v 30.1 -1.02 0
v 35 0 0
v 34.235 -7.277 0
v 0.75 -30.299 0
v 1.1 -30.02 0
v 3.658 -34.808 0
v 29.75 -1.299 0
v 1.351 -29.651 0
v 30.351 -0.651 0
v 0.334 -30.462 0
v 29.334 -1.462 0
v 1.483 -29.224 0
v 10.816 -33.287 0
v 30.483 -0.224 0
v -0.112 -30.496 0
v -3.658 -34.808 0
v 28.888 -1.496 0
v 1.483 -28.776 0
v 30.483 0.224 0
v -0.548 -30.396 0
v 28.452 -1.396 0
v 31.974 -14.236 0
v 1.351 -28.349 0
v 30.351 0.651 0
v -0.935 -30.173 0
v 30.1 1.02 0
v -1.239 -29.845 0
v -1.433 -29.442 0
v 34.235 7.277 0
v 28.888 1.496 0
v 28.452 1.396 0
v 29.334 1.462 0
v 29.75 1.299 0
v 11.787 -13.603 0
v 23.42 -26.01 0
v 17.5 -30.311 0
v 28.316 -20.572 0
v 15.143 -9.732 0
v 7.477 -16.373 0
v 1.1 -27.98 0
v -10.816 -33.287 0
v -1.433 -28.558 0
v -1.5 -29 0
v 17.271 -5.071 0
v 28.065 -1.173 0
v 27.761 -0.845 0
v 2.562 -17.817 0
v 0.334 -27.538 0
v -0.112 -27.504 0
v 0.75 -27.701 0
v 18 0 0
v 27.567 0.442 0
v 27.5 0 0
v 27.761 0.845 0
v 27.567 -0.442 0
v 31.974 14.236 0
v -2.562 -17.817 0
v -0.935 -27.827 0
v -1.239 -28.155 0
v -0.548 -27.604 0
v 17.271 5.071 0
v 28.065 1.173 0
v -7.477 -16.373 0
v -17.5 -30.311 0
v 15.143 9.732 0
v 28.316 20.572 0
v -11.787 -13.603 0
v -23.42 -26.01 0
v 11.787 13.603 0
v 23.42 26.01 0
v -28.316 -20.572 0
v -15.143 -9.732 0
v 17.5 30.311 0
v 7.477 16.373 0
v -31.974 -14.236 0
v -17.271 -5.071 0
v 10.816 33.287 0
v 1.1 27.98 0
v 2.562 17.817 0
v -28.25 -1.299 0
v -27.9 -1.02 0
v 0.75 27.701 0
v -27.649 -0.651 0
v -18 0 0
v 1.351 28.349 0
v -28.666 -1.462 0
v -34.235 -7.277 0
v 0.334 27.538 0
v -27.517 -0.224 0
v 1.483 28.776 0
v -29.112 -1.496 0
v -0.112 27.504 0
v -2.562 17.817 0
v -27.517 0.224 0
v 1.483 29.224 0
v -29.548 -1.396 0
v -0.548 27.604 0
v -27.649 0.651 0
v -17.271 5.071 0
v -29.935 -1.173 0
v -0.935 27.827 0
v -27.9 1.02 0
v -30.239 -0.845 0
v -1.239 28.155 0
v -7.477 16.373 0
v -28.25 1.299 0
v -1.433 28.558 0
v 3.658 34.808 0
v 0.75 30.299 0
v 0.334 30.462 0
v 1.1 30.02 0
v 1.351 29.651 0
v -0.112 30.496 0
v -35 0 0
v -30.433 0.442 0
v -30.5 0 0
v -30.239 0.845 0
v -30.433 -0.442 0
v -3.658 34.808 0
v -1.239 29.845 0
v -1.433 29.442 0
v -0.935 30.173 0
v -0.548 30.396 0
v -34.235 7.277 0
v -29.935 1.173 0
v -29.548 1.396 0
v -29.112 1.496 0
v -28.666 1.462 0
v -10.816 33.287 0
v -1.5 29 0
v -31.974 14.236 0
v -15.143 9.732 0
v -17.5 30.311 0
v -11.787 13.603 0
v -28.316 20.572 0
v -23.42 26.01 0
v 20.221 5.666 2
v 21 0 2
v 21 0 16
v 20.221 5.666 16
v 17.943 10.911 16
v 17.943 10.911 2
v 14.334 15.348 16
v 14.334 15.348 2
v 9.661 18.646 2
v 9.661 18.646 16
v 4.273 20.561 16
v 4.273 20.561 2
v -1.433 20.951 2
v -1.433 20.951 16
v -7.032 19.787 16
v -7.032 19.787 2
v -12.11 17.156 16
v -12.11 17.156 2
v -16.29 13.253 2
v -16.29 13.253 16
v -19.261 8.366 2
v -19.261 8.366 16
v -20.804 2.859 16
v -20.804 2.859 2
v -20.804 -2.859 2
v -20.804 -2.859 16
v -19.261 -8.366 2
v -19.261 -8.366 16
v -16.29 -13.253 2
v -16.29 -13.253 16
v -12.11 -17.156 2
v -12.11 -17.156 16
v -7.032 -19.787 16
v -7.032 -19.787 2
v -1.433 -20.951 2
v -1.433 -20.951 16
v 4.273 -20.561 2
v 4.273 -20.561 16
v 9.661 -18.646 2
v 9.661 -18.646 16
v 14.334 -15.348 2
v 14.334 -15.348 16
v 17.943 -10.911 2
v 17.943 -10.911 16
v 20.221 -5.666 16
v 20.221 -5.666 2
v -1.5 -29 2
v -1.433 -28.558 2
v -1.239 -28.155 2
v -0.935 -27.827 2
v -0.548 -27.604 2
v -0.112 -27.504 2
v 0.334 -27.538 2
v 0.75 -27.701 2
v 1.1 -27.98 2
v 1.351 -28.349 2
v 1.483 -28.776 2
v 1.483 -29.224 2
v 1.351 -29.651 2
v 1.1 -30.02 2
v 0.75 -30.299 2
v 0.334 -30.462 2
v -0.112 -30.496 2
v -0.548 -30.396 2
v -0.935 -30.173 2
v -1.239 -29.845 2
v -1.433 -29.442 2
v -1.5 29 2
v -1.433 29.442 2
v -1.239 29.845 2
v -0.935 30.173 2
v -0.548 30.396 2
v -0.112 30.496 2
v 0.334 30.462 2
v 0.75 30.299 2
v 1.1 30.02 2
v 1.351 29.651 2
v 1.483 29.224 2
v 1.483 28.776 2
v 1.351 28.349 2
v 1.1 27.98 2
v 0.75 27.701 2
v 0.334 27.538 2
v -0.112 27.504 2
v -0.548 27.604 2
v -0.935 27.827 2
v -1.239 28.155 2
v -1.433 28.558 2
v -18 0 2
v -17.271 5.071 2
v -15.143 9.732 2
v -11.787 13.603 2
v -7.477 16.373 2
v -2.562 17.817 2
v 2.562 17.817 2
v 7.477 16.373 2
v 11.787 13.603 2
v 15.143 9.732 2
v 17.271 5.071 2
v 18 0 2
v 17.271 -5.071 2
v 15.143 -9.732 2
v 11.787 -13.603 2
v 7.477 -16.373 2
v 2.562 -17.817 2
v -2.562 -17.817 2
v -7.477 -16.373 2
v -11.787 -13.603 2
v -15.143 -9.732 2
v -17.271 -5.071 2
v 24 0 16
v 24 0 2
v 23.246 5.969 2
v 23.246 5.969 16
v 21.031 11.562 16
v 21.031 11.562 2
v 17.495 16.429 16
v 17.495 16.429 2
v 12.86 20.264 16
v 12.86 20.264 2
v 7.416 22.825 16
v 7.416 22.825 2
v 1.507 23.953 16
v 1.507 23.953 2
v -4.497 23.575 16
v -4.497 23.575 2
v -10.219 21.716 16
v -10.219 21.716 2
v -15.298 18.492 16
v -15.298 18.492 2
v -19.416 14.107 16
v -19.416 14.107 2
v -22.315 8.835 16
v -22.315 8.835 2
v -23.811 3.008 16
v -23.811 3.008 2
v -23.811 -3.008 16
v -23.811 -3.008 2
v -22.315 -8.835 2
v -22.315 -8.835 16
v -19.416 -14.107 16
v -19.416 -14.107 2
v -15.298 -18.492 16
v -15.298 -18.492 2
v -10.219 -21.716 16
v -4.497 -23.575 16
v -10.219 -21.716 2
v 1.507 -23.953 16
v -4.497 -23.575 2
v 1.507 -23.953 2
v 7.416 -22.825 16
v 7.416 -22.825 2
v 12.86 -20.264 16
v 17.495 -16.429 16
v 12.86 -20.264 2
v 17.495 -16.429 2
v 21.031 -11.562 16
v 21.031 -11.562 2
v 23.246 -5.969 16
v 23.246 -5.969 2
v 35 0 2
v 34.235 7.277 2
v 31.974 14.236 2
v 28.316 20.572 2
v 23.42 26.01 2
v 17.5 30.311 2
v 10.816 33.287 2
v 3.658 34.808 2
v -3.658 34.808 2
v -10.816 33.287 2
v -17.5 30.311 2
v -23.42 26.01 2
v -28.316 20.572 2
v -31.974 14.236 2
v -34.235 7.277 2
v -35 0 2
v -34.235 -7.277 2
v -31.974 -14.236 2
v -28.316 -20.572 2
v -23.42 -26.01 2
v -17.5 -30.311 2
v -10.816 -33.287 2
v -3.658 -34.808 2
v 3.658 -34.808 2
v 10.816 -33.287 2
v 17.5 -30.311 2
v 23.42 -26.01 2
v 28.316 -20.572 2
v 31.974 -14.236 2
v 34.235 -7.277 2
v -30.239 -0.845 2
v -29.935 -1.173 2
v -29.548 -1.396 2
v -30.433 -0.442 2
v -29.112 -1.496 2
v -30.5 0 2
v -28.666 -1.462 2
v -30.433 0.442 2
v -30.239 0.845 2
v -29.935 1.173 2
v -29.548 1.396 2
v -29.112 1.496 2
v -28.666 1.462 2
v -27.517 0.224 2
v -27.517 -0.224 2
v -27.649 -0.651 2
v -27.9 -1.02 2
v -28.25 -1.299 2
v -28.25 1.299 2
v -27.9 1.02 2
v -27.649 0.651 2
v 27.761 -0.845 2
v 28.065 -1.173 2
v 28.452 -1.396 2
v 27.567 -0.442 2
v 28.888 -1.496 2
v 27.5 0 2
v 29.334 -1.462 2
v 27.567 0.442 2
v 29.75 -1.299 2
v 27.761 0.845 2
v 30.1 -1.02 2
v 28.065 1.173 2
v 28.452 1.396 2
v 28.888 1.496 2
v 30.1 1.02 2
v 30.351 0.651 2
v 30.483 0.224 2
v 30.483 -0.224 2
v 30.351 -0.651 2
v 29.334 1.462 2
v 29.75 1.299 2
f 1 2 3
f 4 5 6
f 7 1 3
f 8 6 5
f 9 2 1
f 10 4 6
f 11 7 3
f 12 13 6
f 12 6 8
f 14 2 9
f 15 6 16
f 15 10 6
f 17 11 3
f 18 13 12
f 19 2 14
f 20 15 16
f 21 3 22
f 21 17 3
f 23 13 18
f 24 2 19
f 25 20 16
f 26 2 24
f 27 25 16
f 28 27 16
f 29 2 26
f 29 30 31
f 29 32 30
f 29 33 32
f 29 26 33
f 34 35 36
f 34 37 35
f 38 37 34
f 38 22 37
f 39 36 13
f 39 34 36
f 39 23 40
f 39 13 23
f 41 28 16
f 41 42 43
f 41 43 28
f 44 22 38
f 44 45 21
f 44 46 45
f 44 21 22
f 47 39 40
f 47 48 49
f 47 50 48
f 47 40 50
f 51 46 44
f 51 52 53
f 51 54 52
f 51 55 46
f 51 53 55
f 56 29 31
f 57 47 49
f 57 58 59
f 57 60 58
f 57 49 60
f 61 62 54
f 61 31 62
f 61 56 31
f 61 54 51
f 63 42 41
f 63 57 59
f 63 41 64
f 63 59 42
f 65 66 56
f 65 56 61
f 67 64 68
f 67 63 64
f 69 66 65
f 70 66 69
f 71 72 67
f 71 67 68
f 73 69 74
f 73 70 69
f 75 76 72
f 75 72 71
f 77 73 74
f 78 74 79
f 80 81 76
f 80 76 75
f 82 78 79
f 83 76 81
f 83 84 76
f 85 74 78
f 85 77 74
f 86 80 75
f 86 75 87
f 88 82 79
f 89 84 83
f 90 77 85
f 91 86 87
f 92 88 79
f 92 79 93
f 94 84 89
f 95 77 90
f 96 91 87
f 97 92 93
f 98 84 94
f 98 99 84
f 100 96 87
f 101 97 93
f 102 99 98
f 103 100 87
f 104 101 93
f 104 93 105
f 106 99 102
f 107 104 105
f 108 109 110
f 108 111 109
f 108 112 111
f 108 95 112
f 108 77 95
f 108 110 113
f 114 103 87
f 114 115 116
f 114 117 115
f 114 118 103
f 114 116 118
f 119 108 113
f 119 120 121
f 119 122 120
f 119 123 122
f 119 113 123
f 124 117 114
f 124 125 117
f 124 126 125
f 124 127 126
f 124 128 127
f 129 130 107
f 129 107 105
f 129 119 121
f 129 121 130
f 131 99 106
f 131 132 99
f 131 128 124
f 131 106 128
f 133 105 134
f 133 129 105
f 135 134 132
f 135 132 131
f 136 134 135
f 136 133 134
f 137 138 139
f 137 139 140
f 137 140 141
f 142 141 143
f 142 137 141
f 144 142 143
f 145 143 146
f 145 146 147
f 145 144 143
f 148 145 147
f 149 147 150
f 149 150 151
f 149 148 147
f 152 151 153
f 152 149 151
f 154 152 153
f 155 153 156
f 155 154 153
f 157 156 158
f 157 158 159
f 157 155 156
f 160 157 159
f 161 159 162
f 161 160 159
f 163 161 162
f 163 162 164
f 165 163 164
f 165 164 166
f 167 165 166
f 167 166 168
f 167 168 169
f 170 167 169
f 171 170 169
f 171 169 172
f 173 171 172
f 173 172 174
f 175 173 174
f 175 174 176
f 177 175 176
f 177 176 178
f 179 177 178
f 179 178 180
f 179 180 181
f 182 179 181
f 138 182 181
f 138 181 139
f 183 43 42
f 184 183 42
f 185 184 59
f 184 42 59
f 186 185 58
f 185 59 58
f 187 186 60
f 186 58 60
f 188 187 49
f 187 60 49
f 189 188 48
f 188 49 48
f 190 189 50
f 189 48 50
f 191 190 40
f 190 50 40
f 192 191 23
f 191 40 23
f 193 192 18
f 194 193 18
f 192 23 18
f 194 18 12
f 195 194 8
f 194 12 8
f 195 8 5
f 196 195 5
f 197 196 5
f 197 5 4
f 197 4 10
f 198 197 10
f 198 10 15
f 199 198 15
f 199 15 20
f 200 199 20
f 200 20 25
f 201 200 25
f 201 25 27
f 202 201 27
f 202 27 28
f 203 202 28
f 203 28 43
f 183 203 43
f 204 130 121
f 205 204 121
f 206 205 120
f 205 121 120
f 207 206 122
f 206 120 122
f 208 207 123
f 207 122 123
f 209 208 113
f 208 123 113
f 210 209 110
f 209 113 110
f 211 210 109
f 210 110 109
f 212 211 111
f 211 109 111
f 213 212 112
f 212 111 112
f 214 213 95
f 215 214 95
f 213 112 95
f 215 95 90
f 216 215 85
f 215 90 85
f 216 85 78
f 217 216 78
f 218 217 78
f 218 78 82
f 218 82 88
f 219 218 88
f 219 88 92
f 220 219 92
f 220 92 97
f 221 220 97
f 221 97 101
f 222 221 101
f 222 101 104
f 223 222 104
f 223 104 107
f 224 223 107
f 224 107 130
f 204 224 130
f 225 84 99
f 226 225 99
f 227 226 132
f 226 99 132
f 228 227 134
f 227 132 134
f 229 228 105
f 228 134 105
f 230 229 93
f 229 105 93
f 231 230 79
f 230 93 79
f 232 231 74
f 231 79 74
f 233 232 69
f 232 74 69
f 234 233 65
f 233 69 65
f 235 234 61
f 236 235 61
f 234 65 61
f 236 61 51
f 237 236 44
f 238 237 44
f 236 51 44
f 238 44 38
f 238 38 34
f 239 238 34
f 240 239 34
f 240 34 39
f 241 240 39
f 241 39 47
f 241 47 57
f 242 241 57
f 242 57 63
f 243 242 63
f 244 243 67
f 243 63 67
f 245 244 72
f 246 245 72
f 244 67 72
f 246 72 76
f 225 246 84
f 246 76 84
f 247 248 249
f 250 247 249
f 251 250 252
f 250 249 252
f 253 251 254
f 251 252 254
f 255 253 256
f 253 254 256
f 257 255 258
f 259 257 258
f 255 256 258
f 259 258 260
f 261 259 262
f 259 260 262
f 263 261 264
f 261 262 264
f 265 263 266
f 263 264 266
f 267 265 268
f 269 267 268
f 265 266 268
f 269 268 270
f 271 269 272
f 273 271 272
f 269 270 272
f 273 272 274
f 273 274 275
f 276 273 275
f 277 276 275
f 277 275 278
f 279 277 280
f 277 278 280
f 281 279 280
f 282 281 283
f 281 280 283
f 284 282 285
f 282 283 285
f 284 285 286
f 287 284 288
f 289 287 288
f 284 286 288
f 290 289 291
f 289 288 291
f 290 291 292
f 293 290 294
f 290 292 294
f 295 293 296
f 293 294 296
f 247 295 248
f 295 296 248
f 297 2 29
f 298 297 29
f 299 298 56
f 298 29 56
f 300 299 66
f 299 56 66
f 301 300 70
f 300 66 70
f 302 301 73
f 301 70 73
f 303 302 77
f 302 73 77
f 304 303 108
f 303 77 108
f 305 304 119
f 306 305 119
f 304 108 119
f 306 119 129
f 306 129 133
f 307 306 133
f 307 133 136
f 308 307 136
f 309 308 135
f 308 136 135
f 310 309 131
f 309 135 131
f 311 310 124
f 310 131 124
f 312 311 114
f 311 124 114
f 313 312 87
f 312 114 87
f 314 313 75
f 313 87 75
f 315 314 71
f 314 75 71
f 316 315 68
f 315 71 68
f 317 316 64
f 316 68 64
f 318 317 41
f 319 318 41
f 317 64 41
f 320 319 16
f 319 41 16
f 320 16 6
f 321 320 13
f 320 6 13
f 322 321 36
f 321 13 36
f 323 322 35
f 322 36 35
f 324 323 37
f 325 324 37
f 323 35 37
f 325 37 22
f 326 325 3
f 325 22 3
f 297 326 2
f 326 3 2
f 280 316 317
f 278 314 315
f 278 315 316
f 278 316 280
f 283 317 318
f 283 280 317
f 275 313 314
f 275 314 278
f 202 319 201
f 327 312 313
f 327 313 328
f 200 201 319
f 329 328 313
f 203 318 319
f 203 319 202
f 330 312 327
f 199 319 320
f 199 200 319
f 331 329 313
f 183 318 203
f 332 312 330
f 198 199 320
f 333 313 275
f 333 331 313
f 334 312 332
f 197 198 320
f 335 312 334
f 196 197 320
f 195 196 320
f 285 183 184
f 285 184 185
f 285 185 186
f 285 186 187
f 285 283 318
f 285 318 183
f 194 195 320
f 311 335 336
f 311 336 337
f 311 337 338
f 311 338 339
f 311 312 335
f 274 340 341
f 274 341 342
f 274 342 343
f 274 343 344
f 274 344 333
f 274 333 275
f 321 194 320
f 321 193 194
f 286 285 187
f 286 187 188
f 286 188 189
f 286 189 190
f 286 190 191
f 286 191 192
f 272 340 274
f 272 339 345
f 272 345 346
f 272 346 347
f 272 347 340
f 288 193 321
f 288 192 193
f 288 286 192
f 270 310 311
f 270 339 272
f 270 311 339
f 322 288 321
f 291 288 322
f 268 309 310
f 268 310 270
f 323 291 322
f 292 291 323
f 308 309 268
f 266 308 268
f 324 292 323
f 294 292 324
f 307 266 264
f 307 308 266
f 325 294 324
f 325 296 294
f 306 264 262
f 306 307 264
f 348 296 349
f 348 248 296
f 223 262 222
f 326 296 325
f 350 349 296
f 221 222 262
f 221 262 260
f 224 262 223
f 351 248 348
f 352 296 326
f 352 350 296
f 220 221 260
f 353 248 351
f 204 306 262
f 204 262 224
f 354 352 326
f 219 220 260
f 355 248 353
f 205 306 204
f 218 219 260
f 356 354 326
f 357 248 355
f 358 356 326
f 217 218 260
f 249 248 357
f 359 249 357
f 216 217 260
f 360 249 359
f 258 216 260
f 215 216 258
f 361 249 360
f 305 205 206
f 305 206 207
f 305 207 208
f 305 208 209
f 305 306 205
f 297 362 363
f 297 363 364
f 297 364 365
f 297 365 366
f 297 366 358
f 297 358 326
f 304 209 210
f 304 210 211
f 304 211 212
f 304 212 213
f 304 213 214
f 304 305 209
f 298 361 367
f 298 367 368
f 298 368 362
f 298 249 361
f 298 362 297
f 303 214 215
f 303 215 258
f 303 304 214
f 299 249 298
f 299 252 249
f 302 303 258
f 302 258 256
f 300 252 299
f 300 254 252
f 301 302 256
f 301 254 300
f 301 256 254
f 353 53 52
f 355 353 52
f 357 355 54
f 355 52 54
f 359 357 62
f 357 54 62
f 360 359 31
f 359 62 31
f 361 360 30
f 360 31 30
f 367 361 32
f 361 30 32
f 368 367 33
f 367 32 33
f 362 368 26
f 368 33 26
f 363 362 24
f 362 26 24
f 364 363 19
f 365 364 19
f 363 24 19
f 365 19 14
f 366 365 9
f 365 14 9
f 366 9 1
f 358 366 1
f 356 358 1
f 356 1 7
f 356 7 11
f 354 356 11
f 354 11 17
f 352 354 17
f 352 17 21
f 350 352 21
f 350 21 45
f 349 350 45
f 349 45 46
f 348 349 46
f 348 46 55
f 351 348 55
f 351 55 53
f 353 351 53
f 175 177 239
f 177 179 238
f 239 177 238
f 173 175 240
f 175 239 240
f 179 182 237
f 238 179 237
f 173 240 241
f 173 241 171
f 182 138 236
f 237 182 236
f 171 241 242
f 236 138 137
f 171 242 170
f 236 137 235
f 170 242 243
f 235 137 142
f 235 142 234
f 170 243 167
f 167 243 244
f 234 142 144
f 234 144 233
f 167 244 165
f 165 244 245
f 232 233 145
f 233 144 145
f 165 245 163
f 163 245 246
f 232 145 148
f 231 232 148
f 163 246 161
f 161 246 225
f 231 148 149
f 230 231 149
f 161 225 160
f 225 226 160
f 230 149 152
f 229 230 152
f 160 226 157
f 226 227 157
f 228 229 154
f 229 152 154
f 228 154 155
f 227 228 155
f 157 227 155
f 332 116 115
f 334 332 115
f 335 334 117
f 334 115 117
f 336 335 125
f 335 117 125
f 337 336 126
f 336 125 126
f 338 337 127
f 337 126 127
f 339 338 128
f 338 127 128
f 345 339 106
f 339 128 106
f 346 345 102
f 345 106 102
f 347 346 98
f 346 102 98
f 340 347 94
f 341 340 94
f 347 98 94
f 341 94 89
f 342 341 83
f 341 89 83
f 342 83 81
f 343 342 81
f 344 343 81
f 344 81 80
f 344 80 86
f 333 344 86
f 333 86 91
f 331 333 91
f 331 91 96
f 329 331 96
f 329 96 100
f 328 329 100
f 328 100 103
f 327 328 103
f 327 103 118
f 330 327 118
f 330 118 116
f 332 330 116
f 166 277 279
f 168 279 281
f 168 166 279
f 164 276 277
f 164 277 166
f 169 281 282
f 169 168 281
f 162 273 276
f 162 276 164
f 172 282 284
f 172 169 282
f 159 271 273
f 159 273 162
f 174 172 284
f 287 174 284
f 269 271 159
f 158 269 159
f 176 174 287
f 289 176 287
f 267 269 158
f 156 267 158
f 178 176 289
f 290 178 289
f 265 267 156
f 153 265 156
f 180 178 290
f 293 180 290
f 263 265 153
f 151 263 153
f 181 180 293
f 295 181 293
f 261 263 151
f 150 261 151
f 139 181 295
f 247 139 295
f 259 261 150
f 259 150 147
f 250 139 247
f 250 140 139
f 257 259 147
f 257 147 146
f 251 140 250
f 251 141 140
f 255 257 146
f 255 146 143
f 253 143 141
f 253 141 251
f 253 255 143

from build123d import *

# Parameters (mm, degrees)
SKETCH1_R           = 35
BOSS_EXTRUDE1_DEPTH = 2
SKETCH2_R           = 24
SKETCH2_R_2         = 21
BOSS_EXTRUDE2_DEPTH = 14
SKETCH3_R           = 21
CUT_EXTRUDE1_DEPTH  = 10
CUT_EXTRUDE2_REACH  = 18
SKETCH4_R           = 1.5
SKETCH5_R           = 21
SKETCH5_R_2         = 18
BOSS_EXTRUDE3_DEPTH = 2


with BuildPart() as part:
    # Sketch1 → Boss-Extrude1 (new body)
    with BuildSketch(Plane.XY):
        Circle(SKETCH1_R)
    extrude(amount=BOSS_EXTRUDE1_DEPTH)

    # Sketch2 → Boss-Extrude2 (add)
    with BuildSketch(Plane.XY.offset(2)):
        Circle(SKETCH2_R)
        Circle(SKETCH2_R_2, mode=Mode.SUBTRACT)
    extrude(amount=BOSS_EXTRUDE2_DEPTH)

    # Sketch3 → Cut-Extrude1 (cut)
    with BuildSketch(Plane.XY.offset(2)):
        Circle(SKETCH3_R)
    extrude(amount=-CUT_EXTRUDE1_DEPTH, mode=Mode.SUBTRACT)

    # Sketch4 → Cut-Extrude2 (cut, up to next)
    with BuildSketch(Plane(origin=(0, 0, 0), x_dir=(-1, 0, 0), z_dir=(0, 0, -1)), mode=Mode.PRIVATE) as cut_extrude2_sk1:
        with Locations((29, 0)):
            Circle(SKETCH4_R)
    cut_extrude2_tool1 = extrude(cut_extrude2_sk1.sketch, amount=-CUT_EXTRUDE2_REACH, mode=Mode.PRIVATE) & part.part
    add(cut_extrude2_tool1.solids().sort_by_distance((-29, 0, 0))[0], mode=Mode.SUBTRACT)
    # Sketch4 → Cut-Extrude2 (cut, up to next)
    with BuildSketch(Plane(origin=(0, 0, 0), x_dir=(-1, 0, 0), z_dir=(0, 0, -1)), mode=Mode.PRIVATE) as cut_extrude2_sk2:
        with Locations((0, -29)):
            Circle(SKETCH4_R)
    cut_extrude2_tool2 = extrude(cut_extrude2_sk2.sketch, amount=-CUT_EXTRUDE2_REACH, mode=Mode.PRIVATE) & part.part
    add(cut_extrude2_tool2.solids().sort_by_distance((0, -29, 0))[0], mode=Mode.SUBTRACT)
    # Sketch4 → Cut-Extrude2 (cut, up to next)
    with BuildSketch(Plane(origin=(0, 0, 0), x_dir=(-1, 0, 0), z_dir=(0, 0, -1)), mode=Mode.PRIVATE) as cut_extrude2_sk3:
        with Locations((-29, 0)):
            Circle(SKETCH4_R)
    cut_extrude2_tool3 = extrude(cut_extrude2_sk3.sketch, amount=-CUT_EXTRUDE2_REACH, mode=Mode.PRIVATE) & part.part
    add(cut_extrude2_tool3.solids().sort_by_distance((29, 0, 0))[0], mode=Mode.SUBTRACT)
    # Sketch4 → Cut-Extrude2 (cut, up to next)
    with BuildSketch(Plane(origin=(0, 0, 0), x_dir=(-1, 0, 0), z_dir=(0, 0, -1)), mode=Mode.PRIVATE) as cut_extrude2_sk4:
        with Locations((0, 29)):
            Circle(SKETCH4_R)
    cut_extrude2_tool4 = extrude(cut_extrude2_sk4.sketch, amount=-CUT_EXTRUDE2_REACH, mode=Mode.PRIVATE) & part.part
    add(cut_extrude2_tool4.solids().sort_by_distance((0, 29, 0))[0], mode=Mode.SUBTRACT)

    # Sketch5 → Boss-Extrude3 (add)
    with BuildSketch(Plane(origin=(0, 0, 0), x_dir=(-1, 0, 0), z_dir=(0, 0, -1))):
        Circle(SKETCH5_R)
        Circle(SKETCH5_R_2, mode=Mode.SUBTRACT)
    extrude(amount=-BOSS_EXTRUDE3_DEPTH)


solid = part.part
